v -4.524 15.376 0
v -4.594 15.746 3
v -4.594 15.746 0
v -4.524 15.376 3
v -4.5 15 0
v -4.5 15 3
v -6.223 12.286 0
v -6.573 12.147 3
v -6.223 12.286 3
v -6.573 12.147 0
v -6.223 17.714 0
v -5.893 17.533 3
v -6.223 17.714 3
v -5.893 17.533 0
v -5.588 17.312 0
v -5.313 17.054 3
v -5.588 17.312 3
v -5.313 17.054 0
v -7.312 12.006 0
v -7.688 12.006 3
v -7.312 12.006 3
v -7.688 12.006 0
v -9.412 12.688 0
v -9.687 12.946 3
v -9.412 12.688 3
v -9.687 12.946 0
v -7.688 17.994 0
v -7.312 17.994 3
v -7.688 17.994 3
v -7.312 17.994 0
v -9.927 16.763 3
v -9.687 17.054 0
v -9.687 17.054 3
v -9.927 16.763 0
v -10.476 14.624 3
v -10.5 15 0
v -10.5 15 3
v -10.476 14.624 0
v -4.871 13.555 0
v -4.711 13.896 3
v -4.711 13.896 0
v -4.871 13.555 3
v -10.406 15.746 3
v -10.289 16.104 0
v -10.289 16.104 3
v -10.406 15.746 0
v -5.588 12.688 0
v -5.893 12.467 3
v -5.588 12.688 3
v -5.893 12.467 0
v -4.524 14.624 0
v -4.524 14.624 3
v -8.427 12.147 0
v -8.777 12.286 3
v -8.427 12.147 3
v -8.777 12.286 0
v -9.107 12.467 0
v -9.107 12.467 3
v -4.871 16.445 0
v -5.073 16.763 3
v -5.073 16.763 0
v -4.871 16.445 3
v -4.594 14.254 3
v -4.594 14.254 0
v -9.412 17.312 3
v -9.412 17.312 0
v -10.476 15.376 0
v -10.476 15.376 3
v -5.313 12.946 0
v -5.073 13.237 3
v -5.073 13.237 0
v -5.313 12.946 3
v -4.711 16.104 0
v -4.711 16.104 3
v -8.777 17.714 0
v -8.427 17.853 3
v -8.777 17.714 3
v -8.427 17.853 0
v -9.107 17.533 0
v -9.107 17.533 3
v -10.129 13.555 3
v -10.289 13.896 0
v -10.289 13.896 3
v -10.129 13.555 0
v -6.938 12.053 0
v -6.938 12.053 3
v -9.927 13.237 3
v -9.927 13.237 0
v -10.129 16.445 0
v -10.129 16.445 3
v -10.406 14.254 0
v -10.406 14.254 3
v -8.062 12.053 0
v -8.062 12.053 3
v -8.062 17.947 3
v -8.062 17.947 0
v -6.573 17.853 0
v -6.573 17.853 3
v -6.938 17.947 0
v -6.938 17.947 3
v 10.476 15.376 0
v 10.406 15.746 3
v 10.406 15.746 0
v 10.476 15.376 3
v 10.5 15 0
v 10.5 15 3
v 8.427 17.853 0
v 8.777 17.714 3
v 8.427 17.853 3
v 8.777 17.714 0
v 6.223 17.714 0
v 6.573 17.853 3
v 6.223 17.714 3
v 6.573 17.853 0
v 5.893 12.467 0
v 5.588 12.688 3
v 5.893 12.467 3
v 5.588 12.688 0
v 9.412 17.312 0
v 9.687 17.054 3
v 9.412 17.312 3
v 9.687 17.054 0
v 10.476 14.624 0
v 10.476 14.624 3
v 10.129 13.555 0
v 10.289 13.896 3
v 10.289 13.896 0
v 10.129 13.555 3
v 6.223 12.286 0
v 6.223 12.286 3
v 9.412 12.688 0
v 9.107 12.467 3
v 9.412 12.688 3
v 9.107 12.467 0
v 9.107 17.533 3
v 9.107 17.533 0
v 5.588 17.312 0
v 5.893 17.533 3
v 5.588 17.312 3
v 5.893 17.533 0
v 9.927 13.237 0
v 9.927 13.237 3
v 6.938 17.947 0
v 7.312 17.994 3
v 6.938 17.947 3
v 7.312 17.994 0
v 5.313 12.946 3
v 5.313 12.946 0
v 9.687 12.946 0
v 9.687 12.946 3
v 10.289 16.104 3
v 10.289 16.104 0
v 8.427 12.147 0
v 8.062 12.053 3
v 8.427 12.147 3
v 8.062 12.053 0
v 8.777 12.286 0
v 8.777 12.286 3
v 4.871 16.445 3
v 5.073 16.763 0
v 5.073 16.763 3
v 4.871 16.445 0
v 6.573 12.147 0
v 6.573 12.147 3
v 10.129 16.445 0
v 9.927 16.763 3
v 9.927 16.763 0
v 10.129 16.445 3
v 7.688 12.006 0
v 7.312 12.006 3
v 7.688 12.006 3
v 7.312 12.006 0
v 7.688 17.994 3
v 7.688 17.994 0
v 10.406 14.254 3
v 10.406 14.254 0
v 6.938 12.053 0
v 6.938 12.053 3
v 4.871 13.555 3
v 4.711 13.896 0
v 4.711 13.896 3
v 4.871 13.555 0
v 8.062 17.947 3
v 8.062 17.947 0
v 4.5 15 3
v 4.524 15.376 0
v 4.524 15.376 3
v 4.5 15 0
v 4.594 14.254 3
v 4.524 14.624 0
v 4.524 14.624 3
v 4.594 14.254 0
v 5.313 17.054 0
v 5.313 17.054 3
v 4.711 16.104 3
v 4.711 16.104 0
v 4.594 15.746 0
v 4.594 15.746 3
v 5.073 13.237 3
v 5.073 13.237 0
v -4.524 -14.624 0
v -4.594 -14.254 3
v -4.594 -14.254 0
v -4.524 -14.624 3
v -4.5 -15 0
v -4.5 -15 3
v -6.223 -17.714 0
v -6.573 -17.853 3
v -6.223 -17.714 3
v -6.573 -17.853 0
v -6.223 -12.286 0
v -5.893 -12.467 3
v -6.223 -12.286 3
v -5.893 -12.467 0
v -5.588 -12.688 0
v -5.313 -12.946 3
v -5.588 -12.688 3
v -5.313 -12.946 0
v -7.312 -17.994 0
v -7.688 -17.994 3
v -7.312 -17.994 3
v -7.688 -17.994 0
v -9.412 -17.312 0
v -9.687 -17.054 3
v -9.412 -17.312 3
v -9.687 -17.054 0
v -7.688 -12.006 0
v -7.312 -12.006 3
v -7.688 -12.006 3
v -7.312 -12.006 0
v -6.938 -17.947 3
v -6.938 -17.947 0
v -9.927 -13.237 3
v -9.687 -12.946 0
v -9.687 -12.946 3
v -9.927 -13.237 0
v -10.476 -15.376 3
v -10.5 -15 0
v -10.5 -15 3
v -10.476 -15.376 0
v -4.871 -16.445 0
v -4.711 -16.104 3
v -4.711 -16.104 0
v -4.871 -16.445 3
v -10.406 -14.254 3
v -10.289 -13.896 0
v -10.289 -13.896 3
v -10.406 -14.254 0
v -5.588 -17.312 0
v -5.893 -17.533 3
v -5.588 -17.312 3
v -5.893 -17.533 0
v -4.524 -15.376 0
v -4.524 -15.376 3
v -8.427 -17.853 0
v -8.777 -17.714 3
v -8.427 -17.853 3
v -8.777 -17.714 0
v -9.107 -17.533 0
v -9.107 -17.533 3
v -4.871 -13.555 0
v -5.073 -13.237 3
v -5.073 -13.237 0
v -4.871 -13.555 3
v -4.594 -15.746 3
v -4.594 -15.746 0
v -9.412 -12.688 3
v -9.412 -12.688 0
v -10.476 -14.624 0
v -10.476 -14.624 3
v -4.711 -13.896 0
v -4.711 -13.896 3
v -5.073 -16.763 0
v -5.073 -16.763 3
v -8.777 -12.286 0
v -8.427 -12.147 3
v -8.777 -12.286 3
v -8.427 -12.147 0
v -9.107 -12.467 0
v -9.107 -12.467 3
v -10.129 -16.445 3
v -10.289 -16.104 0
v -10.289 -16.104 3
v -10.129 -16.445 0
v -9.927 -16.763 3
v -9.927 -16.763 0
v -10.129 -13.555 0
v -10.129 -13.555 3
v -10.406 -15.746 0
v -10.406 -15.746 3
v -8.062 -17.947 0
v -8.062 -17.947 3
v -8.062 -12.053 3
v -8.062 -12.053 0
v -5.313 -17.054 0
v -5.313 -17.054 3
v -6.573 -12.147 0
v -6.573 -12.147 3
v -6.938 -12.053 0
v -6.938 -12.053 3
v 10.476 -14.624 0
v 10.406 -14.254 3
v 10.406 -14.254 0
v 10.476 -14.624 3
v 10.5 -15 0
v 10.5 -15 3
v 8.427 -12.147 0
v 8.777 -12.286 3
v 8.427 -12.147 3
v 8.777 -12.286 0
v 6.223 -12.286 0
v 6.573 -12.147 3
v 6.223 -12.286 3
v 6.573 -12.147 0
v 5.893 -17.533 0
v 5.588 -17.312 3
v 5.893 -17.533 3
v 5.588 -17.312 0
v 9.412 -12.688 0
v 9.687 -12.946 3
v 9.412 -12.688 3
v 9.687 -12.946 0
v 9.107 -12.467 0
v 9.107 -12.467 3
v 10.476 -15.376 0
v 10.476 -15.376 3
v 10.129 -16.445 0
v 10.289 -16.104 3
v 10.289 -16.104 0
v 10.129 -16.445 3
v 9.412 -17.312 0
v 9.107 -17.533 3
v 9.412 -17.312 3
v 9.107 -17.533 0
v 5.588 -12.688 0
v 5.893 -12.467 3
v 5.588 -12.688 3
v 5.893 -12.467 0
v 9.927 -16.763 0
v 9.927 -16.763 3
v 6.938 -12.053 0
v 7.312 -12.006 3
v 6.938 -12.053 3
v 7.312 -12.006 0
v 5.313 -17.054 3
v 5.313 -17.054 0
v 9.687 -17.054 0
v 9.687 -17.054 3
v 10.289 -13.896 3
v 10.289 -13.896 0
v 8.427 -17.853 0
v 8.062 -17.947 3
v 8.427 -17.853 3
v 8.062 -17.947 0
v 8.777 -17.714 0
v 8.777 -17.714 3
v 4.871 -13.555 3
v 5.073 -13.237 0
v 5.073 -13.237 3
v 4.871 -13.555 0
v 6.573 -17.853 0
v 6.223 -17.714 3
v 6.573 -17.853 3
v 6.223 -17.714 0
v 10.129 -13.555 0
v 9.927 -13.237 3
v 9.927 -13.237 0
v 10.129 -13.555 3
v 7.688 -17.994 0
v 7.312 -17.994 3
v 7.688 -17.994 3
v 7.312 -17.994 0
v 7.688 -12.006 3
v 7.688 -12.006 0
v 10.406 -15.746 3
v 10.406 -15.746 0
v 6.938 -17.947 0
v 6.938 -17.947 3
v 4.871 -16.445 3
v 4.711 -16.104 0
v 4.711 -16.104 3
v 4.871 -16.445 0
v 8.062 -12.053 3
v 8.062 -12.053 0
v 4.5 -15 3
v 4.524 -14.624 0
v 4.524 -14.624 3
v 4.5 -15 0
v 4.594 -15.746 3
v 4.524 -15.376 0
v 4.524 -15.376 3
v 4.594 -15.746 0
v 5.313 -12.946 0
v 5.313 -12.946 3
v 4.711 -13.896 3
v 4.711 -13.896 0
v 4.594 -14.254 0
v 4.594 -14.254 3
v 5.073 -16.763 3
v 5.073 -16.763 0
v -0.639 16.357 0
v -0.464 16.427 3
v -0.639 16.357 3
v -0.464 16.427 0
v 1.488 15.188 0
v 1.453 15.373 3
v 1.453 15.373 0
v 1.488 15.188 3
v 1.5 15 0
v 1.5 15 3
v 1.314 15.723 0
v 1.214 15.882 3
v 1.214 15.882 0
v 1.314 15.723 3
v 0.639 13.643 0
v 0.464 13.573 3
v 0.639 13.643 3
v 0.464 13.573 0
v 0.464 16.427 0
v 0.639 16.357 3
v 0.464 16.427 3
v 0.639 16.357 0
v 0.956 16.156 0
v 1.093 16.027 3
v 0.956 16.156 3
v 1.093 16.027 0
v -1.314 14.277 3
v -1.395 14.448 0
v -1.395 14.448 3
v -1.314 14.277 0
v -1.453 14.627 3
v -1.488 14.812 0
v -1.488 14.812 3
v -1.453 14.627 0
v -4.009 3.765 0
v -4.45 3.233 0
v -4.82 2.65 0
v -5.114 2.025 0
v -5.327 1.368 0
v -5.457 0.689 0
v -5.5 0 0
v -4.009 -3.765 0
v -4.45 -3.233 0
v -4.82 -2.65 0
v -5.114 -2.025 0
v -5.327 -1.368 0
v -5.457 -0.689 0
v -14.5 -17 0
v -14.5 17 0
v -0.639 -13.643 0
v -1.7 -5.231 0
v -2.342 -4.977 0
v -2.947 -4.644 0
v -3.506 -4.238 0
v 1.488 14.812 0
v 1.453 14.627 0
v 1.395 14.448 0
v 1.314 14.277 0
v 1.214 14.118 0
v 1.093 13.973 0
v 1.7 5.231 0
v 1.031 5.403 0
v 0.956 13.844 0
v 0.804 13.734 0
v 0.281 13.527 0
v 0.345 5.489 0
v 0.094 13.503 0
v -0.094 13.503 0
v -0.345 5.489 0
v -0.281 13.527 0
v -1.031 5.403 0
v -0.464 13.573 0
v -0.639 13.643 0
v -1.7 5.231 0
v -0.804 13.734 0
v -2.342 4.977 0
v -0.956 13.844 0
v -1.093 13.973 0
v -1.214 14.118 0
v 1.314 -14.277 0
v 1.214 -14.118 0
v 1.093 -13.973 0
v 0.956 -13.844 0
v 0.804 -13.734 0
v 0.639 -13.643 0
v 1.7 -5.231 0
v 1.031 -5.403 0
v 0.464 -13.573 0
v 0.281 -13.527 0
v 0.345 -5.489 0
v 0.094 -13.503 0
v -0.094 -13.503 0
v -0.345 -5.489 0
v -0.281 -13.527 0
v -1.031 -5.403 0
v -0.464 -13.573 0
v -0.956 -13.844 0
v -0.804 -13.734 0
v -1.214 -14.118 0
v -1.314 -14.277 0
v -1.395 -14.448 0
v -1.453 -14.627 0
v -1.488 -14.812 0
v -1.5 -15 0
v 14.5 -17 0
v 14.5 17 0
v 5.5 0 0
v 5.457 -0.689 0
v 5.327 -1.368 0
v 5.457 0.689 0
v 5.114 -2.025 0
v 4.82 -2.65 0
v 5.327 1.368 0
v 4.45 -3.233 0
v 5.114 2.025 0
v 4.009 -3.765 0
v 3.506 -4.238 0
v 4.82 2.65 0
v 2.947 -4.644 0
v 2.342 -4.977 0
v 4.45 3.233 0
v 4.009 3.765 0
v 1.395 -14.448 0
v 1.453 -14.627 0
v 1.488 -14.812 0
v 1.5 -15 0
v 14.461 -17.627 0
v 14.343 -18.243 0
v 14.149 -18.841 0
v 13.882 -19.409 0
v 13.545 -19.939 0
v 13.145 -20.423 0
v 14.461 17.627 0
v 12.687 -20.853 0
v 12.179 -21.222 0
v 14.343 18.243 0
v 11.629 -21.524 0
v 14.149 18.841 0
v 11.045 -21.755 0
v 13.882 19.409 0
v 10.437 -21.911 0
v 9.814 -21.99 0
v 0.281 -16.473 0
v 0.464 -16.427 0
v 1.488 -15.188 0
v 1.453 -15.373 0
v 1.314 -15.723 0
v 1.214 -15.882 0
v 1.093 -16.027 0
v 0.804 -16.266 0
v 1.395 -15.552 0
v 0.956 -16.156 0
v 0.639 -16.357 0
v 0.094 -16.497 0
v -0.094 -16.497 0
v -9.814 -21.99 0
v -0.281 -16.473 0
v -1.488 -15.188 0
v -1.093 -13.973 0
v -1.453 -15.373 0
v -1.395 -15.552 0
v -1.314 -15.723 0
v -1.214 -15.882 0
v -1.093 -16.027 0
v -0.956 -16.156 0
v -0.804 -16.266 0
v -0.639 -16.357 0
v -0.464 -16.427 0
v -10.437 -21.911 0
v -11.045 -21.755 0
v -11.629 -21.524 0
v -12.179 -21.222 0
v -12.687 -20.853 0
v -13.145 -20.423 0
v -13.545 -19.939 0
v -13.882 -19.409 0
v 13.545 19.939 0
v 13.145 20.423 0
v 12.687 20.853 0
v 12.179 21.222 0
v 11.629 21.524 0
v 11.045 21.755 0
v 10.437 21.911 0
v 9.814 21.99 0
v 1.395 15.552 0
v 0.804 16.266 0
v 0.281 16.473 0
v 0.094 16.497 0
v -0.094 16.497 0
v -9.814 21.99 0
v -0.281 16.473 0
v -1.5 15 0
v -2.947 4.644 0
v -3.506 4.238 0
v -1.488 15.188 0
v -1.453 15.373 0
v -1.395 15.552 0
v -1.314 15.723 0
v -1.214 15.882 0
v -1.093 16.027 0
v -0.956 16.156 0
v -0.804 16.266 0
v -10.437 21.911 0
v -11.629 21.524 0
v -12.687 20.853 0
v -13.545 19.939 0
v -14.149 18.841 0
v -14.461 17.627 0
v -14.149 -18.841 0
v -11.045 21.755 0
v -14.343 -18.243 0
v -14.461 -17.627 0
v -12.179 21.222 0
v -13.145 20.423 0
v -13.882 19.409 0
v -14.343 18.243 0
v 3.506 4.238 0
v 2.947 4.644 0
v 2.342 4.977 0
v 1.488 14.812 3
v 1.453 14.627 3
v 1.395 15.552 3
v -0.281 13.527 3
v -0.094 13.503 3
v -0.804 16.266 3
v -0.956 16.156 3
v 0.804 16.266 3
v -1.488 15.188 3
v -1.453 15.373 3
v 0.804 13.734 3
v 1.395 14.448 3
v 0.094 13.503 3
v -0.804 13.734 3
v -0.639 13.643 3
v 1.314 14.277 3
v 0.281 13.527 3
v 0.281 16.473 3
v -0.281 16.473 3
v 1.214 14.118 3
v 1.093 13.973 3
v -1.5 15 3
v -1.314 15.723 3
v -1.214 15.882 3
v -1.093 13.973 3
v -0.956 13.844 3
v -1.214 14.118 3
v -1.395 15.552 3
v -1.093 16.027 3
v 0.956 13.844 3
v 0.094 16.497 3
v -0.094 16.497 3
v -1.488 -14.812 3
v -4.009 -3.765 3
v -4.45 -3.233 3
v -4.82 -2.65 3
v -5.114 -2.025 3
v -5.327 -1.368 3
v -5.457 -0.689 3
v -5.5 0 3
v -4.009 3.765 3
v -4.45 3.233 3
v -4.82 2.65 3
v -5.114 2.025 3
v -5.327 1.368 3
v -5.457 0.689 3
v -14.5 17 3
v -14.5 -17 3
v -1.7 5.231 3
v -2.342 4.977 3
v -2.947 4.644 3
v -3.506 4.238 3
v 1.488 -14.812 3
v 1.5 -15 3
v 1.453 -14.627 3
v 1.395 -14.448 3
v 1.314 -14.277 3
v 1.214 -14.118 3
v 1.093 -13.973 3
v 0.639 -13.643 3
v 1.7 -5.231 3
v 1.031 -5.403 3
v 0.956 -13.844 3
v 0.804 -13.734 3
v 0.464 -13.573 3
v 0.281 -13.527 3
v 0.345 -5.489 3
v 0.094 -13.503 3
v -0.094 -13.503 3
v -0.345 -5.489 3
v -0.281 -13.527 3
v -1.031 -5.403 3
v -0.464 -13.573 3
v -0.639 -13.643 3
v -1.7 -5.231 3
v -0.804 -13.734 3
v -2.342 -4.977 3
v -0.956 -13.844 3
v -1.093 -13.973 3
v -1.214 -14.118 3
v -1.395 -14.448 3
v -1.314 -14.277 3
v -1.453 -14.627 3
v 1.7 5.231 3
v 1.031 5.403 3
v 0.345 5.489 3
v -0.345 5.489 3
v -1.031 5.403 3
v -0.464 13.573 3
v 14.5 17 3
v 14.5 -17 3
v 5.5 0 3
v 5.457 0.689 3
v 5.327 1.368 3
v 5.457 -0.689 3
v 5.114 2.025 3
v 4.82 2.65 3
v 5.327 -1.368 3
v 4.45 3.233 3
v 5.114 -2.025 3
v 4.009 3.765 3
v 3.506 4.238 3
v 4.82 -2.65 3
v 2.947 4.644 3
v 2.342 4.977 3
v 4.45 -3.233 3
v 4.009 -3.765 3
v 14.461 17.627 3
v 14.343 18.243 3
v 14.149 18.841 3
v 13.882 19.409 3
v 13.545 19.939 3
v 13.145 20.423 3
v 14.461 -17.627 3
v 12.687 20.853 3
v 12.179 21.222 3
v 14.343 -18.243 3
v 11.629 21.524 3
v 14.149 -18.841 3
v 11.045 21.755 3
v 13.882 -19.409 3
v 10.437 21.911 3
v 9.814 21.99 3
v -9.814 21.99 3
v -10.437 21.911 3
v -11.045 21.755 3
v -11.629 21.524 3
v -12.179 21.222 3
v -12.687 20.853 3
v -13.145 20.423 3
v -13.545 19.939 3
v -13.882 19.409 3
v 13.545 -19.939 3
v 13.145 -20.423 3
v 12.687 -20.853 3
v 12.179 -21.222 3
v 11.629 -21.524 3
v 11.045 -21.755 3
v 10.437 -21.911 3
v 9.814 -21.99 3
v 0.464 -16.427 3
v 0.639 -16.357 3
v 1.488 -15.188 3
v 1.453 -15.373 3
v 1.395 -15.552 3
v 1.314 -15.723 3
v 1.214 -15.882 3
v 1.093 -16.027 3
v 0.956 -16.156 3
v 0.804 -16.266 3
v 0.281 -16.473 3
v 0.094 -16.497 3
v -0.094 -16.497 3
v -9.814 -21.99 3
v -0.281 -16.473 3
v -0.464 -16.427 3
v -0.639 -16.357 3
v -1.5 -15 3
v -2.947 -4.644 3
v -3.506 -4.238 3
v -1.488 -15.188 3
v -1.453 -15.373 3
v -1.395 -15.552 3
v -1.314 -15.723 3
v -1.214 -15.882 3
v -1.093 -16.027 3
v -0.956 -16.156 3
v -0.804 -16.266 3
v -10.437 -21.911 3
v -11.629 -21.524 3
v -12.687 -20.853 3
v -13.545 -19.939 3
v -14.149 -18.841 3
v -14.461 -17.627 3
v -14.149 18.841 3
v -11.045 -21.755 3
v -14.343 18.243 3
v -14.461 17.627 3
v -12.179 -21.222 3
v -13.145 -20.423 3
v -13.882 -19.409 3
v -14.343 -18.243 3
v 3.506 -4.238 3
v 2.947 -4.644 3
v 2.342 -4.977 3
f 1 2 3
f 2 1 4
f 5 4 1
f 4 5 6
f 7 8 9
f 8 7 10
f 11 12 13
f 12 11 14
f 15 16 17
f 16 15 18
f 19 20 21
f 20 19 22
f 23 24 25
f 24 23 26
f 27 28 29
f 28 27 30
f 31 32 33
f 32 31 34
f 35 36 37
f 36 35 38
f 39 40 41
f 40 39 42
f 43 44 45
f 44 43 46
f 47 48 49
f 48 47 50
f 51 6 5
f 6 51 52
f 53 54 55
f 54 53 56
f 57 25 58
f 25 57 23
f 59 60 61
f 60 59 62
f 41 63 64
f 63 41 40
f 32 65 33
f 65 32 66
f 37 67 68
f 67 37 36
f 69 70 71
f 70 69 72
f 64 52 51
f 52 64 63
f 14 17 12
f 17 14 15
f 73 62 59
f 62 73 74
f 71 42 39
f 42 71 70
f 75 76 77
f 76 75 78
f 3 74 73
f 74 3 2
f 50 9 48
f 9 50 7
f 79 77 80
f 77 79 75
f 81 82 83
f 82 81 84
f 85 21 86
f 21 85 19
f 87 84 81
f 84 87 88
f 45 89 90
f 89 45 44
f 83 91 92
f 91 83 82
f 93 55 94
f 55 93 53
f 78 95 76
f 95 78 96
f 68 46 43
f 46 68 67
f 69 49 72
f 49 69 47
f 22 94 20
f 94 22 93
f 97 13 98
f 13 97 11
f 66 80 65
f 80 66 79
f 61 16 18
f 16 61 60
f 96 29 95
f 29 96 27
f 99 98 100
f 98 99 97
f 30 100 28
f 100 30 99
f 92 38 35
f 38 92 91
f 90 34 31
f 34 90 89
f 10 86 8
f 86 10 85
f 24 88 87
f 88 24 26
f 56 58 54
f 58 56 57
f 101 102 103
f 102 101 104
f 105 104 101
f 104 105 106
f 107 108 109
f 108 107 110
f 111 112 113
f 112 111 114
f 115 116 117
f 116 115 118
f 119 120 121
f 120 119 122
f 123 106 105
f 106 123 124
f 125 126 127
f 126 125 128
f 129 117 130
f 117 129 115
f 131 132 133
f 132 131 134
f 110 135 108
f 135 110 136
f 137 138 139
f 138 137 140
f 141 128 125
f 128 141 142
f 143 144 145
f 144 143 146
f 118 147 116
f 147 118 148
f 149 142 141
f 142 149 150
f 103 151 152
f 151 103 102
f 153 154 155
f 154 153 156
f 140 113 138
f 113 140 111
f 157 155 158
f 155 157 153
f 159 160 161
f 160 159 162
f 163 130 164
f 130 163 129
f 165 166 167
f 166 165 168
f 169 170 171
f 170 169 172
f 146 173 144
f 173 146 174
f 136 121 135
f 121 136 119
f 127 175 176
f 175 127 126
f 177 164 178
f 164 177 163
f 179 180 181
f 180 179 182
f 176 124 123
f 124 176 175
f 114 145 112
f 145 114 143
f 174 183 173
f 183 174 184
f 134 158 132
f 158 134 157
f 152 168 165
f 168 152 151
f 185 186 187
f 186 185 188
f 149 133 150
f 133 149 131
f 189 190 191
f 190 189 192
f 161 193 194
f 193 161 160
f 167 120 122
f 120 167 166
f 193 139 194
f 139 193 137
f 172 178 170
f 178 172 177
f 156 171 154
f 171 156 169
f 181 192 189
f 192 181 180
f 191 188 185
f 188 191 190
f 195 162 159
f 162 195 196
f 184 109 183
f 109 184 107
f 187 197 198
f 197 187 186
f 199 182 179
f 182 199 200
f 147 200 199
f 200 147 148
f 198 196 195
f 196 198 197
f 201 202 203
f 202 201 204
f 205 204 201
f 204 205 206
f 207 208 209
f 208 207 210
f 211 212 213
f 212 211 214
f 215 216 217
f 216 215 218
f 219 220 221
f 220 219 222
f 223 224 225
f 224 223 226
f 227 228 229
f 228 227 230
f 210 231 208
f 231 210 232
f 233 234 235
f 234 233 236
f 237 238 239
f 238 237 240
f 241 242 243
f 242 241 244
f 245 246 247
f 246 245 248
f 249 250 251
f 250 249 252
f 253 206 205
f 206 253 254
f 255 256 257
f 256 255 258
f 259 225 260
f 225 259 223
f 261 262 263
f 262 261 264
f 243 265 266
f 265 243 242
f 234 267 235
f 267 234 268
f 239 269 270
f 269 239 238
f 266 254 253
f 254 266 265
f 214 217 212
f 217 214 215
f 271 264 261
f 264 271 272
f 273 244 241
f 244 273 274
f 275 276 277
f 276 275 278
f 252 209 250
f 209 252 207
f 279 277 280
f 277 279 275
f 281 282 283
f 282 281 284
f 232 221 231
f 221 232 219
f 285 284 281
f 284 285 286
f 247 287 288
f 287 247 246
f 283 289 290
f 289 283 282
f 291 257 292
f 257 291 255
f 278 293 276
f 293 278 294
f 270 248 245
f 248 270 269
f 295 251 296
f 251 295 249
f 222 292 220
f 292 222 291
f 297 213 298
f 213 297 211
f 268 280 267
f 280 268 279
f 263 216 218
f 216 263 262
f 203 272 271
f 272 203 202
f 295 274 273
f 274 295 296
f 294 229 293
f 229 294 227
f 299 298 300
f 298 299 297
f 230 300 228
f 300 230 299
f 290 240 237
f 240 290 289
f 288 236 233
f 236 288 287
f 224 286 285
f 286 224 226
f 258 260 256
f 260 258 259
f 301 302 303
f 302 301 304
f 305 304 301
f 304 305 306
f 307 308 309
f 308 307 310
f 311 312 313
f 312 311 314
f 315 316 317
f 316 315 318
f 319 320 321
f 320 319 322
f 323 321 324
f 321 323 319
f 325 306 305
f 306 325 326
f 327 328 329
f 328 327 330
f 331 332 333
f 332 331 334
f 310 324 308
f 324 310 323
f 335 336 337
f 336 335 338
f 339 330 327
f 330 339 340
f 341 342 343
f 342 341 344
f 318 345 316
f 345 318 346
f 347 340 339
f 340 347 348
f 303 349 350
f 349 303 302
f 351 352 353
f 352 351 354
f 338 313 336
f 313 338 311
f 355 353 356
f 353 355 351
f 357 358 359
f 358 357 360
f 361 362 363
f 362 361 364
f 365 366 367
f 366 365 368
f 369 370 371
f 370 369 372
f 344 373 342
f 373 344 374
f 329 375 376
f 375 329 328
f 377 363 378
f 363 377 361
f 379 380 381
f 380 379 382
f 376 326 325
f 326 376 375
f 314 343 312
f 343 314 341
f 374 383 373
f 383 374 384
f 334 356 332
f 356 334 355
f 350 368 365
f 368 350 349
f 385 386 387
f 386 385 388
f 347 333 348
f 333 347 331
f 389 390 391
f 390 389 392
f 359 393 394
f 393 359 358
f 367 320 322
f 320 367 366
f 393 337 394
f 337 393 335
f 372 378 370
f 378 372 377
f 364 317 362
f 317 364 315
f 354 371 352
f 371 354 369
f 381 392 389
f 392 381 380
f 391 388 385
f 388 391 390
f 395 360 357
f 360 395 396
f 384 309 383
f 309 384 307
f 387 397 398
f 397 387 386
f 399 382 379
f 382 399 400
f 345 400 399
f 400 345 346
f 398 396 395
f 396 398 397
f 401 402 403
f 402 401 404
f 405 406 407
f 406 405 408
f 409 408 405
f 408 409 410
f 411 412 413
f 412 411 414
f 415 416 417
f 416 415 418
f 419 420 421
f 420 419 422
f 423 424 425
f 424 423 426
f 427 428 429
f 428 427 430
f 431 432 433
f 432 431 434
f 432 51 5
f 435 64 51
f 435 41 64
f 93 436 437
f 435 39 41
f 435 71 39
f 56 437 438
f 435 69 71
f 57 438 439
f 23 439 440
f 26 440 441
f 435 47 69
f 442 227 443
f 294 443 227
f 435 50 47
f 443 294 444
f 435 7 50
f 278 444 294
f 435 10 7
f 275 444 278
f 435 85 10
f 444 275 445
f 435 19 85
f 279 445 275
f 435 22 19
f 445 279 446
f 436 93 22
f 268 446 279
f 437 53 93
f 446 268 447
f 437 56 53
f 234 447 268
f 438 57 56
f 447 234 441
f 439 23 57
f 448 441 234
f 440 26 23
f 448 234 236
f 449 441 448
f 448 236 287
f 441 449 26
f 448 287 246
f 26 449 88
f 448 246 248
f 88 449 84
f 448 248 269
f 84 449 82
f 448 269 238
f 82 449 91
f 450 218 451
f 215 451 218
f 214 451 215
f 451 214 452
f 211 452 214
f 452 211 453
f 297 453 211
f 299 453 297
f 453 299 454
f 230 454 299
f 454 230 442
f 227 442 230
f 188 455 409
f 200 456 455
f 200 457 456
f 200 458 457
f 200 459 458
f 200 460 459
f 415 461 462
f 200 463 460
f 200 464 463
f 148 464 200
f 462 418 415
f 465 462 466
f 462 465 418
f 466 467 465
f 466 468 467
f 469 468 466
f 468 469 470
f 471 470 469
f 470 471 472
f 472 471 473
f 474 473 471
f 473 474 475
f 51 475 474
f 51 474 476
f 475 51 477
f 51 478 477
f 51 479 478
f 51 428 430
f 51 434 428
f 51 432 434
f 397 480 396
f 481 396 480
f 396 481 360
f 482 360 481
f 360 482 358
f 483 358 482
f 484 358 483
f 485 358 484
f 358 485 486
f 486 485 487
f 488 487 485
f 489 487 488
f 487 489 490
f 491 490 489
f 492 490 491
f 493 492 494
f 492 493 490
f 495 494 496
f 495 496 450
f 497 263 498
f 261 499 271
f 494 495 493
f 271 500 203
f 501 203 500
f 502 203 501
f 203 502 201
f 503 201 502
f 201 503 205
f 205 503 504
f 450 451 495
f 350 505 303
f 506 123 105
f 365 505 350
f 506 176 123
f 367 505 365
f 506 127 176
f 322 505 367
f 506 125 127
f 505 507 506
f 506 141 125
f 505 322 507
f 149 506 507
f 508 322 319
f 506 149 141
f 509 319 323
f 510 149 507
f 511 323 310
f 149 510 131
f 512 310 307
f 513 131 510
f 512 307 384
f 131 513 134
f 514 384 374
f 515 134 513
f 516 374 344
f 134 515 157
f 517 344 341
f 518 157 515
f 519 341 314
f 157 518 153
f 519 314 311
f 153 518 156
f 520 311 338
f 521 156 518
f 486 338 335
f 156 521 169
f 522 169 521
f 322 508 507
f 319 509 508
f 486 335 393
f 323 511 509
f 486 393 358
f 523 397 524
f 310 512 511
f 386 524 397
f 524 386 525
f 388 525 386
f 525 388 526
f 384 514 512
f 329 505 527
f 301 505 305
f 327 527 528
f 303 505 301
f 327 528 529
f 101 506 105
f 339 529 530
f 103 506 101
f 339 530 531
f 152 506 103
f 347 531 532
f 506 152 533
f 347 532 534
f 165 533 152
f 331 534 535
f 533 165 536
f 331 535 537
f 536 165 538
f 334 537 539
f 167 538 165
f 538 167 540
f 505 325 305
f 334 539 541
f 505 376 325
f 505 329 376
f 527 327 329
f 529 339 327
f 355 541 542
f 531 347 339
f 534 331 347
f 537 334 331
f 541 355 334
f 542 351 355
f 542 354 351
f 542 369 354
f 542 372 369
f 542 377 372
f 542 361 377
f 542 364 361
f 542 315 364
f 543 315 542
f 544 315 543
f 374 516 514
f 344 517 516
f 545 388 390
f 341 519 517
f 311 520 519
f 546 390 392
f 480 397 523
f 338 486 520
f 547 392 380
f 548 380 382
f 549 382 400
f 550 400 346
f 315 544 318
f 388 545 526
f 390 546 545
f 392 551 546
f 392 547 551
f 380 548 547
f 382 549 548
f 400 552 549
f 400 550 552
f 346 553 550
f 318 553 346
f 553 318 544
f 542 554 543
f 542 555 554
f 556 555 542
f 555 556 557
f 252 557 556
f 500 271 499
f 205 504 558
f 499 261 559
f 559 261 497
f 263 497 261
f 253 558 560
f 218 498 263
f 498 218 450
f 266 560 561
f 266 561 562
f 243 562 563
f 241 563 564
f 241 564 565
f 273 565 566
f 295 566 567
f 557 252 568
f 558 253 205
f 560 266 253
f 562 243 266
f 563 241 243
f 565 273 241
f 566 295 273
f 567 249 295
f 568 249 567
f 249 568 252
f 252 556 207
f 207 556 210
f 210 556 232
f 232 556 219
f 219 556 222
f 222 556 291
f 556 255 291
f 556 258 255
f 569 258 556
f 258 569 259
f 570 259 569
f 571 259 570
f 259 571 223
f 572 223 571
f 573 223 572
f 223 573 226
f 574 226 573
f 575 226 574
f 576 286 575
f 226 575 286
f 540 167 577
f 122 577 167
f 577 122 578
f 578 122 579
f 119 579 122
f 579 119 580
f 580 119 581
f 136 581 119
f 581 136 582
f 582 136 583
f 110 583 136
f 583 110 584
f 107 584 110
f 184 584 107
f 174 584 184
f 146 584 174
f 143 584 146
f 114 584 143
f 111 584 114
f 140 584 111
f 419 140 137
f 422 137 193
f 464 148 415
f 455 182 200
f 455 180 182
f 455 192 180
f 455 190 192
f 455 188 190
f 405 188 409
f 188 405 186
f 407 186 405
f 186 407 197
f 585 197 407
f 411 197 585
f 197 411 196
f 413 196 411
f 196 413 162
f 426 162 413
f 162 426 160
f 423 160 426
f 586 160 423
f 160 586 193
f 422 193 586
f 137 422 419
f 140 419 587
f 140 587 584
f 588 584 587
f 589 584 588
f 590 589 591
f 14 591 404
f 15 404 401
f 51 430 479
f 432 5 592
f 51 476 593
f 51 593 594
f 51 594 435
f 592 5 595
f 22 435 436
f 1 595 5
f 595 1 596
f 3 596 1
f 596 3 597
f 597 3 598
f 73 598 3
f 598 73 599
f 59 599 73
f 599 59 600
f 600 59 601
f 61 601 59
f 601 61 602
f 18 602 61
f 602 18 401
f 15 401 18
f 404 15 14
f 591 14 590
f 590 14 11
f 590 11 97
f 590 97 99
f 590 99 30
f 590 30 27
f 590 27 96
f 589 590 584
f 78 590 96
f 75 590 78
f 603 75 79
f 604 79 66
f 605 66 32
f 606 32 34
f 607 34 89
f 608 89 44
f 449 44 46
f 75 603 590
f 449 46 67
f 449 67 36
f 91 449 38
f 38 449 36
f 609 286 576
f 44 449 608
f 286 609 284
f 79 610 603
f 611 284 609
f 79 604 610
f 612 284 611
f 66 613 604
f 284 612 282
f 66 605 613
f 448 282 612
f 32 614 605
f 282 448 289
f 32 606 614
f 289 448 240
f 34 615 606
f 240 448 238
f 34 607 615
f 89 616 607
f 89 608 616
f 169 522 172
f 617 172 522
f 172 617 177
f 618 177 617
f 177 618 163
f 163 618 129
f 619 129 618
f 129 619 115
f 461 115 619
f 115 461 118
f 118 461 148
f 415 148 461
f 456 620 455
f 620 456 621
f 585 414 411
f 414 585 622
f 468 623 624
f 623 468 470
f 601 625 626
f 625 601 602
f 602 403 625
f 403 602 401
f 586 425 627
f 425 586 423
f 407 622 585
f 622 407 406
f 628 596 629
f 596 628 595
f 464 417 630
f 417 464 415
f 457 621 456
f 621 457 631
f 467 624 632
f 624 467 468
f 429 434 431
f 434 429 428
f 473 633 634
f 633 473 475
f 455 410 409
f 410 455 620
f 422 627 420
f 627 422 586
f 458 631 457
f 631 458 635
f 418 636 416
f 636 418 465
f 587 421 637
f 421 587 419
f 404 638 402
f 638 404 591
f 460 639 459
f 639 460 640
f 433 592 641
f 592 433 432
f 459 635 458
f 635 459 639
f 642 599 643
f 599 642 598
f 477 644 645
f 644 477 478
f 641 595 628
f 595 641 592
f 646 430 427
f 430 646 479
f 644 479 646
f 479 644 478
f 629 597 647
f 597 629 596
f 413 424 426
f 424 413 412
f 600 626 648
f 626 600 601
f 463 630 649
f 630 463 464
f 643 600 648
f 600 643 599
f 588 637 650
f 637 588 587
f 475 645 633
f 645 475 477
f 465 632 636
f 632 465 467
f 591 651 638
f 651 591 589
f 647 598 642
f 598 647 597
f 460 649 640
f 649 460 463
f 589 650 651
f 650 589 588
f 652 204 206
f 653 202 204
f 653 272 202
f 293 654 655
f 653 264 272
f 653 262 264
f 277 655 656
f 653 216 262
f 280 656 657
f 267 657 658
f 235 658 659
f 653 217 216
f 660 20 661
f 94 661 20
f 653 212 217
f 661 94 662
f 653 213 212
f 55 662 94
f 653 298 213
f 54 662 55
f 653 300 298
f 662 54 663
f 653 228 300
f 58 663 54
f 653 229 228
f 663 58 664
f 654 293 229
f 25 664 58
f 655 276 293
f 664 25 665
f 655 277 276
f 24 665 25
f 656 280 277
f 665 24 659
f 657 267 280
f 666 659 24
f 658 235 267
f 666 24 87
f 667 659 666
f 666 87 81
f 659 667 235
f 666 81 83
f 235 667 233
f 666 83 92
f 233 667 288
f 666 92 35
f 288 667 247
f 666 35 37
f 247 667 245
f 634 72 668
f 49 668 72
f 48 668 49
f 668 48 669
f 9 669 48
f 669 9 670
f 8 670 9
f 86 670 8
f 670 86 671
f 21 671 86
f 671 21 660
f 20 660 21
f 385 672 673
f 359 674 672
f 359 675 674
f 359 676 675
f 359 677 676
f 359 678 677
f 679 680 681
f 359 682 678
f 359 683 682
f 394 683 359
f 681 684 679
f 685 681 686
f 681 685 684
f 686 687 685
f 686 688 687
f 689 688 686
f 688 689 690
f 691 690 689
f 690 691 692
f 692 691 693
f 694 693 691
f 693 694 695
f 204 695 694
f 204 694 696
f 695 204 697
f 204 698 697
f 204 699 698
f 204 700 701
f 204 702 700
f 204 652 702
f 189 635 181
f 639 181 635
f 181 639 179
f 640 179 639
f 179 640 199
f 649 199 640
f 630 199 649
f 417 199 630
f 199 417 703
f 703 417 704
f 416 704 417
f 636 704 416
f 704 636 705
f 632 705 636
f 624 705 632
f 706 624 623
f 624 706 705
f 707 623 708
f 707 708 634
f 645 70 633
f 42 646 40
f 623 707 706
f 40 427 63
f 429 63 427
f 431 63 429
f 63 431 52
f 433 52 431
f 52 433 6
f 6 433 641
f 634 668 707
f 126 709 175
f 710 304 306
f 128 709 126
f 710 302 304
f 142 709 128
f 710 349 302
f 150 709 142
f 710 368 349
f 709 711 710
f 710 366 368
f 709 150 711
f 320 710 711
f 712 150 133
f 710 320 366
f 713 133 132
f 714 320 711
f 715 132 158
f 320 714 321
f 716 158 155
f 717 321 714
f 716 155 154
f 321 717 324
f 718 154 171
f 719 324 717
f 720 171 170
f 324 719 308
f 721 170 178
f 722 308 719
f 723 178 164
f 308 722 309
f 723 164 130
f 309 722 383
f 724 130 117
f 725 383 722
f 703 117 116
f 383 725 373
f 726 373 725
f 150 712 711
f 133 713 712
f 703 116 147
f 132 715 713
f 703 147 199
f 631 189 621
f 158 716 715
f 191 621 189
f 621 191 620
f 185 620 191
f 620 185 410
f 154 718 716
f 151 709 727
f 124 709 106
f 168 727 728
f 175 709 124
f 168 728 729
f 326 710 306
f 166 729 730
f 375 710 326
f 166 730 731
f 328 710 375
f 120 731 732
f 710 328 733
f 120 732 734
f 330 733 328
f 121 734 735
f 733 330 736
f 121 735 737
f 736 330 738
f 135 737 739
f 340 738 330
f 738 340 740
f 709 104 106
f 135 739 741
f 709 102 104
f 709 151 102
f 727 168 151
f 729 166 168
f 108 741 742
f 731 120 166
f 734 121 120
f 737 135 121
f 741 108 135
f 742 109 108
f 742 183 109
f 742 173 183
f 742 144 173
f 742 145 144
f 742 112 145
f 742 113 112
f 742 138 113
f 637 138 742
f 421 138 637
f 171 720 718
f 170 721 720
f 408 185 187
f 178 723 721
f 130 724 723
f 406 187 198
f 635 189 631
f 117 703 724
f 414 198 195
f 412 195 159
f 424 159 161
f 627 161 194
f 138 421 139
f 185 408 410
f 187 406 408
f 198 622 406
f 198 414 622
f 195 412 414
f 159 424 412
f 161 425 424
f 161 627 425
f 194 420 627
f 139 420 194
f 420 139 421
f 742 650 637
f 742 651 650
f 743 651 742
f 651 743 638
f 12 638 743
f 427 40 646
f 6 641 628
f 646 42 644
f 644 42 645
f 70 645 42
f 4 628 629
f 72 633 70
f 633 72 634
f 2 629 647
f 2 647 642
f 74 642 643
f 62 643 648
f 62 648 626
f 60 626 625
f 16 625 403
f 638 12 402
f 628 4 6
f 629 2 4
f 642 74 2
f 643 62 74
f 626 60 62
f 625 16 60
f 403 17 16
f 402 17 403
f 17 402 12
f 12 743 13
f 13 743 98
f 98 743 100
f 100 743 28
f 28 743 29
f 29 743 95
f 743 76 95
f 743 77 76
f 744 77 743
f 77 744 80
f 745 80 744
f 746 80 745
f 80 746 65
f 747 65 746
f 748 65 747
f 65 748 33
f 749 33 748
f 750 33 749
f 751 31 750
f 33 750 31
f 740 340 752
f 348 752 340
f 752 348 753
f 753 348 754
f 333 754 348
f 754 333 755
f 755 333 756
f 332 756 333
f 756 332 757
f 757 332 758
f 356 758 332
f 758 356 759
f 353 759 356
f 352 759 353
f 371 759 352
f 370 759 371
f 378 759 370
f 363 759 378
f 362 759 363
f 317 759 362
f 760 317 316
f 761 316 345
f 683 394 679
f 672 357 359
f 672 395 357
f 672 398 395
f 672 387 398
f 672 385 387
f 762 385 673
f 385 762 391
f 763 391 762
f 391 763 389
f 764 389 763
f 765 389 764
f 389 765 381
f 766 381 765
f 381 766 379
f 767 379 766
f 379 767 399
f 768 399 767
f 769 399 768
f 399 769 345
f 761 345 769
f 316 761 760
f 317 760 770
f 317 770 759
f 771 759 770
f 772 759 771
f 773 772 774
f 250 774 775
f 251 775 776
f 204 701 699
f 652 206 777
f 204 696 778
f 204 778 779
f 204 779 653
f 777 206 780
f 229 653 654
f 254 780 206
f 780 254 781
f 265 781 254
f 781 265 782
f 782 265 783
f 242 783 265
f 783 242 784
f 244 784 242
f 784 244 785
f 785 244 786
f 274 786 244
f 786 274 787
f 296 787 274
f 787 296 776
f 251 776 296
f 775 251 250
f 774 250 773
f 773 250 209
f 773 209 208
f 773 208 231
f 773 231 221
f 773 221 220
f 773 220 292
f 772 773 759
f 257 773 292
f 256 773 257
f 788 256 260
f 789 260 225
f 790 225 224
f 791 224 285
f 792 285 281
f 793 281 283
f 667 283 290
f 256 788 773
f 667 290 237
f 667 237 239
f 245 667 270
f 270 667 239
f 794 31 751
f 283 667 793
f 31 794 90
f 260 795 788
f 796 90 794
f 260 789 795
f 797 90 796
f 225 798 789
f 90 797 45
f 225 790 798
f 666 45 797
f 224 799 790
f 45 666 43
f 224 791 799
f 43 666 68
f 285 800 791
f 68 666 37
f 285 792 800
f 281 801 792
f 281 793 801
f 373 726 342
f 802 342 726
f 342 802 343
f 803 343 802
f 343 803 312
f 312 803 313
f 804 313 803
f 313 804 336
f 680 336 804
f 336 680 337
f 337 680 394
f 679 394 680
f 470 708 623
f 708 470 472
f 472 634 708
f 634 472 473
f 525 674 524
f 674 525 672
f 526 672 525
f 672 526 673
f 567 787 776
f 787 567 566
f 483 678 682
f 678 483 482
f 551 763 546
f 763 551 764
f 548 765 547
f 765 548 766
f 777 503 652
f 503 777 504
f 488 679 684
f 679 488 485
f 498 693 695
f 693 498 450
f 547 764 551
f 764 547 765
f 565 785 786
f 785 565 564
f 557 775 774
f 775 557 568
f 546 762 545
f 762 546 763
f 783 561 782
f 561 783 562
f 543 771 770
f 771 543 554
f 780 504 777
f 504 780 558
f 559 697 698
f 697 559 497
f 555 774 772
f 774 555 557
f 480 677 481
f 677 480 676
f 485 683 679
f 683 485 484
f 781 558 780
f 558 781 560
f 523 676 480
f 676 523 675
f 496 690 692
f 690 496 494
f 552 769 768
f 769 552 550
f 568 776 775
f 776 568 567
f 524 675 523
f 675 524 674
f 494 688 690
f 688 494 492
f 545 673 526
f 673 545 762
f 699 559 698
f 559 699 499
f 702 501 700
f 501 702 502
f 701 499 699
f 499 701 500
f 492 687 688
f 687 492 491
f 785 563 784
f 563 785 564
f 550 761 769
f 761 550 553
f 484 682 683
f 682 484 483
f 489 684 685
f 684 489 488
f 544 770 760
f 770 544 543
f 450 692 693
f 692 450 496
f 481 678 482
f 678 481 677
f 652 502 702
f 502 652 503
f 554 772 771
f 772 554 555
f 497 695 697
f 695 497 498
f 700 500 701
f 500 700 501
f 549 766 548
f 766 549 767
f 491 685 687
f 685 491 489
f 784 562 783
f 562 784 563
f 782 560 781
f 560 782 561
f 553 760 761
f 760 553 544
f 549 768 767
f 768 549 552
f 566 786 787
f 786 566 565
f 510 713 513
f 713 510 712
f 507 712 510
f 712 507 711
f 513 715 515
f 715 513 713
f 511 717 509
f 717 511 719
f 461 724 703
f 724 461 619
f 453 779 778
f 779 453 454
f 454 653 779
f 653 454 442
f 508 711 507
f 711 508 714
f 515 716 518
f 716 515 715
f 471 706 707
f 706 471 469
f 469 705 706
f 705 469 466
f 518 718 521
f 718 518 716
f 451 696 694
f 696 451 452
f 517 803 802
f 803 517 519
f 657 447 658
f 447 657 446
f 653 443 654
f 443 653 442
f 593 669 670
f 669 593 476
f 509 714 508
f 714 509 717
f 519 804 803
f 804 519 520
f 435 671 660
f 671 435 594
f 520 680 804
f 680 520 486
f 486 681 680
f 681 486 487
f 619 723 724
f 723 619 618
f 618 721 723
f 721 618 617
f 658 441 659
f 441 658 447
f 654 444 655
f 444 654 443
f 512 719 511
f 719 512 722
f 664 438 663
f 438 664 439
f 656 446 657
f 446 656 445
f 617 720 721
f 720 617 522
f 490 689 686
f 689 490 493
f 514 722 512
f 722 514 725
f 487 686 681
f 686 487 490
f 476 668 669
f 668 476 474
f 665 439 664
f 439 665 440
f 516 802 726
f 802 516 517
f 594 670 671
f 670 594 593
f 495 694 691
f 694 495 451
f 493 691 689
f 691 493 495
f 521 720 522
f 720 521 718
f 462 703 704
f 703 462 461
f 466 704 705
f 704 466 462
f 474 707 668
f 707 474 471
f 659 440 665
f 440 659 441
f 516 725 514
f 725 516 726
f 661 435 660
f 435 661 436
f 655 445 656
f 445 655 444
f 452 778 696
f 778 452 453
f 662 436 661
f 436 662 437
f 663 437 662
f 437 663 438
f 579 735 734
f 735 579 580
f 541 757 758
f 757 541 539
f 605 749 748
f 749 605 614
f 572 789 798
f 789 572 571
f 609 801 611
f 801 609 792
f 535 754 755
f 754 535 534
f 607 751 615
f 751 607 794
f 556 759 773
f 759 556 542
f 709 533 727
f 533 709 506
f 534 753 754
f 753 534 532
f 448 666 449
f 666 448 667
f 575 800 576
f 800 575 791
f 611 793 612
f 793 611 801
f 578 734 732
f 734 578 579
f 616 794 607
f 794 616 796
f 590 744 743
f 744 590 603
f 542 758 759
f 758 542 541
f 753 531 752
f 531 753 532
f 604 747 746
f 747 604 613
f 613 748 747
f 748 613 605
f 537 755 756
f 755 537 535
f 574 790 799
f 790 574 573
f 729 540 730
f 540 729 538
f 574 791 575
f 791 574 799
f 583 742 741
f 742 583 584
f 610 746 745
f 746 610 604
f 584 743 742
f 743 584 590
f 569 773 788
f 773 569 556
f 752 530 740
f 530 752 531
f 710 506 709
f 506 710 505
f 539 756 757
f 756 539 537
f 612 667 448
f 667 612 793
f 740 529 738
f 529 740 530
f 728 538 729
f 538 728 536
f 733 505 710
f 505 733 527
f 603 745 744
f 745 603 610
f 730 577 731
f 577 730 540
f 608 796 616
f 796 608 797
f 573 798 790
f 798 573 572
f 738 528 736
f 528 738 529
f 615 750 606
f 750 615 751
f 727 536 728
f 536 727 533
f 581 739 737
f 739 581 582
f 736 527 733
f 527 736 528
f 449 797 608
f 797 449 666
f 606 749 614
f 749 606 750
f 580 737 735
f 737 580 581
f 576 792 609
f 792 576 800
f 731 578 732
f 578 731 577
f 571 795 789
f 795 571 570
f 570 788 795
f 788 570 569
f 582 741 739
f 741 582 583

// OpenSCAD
$fn = 50;


difference() {
	union() {
		hull() {
			translate(v = [-9.5000000000, 17.0000000000, 0]) {
				cylinder(h = 3, r = 5);
			}
			translate(v = [9.5000000000, 17.0000000000, 0]) {
				cylinder(h = 3, r = 5);
			}
			translate(v = [-9.5000000000, -17.0000000000, 0]) {
				cylinder(h = 3, r = 5);
			}
			translate(v = [9.5000000000, -17.0000000000, 0]) {
				cylinder(h = 3, r = 5);
			}
		}
	}
	union() {
		#translate(v = [-7.5000000000, 15.0000000000, 0]) {
			cylinder(h = 3, r = 3.0000000000);
		}
		#translate(v = [7.5000000000, 15.0000000000, 0]) {
			cylinder(h = 3, r = 3.0000000000);
		}
		#translate(v = [-7.5000000000, -15.0000000000, 0]) {
			cylinder(h = 3, r = 3.0000000000);
		}
		#translate(v = [7.5000000000, -15.0000000000, 0]) {
			cylinder(h = 3, r = 3.0000000000);
		}
		#translate(v = [-7.5000000000, -15.0000000000, -100.0000000000]) {
			cylinder(h = 200, r = 3.0000000000);
		}
		#translate(v = [-7.5000000000, 15.0000000000, -100.0000000000]) {
			cylinder(h = 200, r = 3.0000000000);
		}
		#translate(v = [7.5000000000, -15.0000000000, -100.0000000000]) {
			cylinder(h = 200, r = 3.0000000000);
		}
		#translate(v = [7.5000000000, 15.0000000000, -100.0000000000]) {
			cylinder(h = 200, r = 3.0000000000);
		}
		#translate(v = [-7.5000000000, 15.0000000000, 0]) {
			cylinder(h = 3, r = 1.5000000000);
		}
		#translate(v = [0.0000000000, 15.0000000000, 0]) {
			cylinder(h = 3, r = 1.5000000000);
		}
		#translate(v = [7.5000000000, 15.0000000000, 0]) {
			cylinder(h = 3, r = 1.5000000000);
		}
		#translate(v = [-7.5000000000, -15.0000000000, 0]) {
			cylinder(h = 3, r = 1.5000000000);
		}
		#translate(v = [0.0000000000, -15.0000000000, 0]) {
			cylinder(h = 3, r = 1.5000000000);
		}
		#translate(v = [7.5000000000, -15.0000000000, 0]) {
			cylinder(h = 3, r = 1.5000000000);
		}
		#translate(v = [-7.5000000000, 15.0000000000, 0]) {
			cylinder(h = 3, r = 1.5000000000);
		}
		#translate(v = [0.0000000000, 15.0000000000, 0]) {
			cylinder(h = 3, r = 1.5000000000);
		}
		#translate(v = [7.5000000000, 15.0000000000, 0]) {
			cylinder(h = 3, r = 1.5000000000);
		}
		#translate(v = [-7.5000000000, -15.0000000000, 0]) {
			cylinder(h = 3, r = 1.5000000000);
		}
		#translate(v = [0.0000000000, -15.0000000000, 0]) {
			cylinder(h = 3, r = 1.5000000000);
		}
		#translate(v = [7.5000000000, -15.0000000000, 0]) {
			cylinder(h = 3, r = 1.5000000000);
		}
		#translate(v = [-7.5000000000, 15.0000000000, 0]) {
			cylinder(h = 3, r = 1.5000000000);
		}
		#translate(v = [0.0000000000, 15.0000000000, 0]) {
			cylinder(h = 3, r = 1.5000000000);
		}
		#translate(v = [7.5000000000, 15.0000000000, 0]) {
			cylinder(h = 3, r = 1.5000000000);
		}
		#translate(v = [-7.5000000000, -15.0000000000, 0]) {
			cylinder(h = 3, r = 1.5000000000);
		}
		#translate(v = [0.0000000000, -15.0000000000, 0]) {
			cylinder(h = 3, r = 1.5000000000);
		}
		#translate(v = [7.5000000000, -15.0000000000, 0]) {
			cylinder(h = 3, r = 1.5000000000);
		}
		#cylinder(h = 3, r = 5.5000000000);
	}
}
